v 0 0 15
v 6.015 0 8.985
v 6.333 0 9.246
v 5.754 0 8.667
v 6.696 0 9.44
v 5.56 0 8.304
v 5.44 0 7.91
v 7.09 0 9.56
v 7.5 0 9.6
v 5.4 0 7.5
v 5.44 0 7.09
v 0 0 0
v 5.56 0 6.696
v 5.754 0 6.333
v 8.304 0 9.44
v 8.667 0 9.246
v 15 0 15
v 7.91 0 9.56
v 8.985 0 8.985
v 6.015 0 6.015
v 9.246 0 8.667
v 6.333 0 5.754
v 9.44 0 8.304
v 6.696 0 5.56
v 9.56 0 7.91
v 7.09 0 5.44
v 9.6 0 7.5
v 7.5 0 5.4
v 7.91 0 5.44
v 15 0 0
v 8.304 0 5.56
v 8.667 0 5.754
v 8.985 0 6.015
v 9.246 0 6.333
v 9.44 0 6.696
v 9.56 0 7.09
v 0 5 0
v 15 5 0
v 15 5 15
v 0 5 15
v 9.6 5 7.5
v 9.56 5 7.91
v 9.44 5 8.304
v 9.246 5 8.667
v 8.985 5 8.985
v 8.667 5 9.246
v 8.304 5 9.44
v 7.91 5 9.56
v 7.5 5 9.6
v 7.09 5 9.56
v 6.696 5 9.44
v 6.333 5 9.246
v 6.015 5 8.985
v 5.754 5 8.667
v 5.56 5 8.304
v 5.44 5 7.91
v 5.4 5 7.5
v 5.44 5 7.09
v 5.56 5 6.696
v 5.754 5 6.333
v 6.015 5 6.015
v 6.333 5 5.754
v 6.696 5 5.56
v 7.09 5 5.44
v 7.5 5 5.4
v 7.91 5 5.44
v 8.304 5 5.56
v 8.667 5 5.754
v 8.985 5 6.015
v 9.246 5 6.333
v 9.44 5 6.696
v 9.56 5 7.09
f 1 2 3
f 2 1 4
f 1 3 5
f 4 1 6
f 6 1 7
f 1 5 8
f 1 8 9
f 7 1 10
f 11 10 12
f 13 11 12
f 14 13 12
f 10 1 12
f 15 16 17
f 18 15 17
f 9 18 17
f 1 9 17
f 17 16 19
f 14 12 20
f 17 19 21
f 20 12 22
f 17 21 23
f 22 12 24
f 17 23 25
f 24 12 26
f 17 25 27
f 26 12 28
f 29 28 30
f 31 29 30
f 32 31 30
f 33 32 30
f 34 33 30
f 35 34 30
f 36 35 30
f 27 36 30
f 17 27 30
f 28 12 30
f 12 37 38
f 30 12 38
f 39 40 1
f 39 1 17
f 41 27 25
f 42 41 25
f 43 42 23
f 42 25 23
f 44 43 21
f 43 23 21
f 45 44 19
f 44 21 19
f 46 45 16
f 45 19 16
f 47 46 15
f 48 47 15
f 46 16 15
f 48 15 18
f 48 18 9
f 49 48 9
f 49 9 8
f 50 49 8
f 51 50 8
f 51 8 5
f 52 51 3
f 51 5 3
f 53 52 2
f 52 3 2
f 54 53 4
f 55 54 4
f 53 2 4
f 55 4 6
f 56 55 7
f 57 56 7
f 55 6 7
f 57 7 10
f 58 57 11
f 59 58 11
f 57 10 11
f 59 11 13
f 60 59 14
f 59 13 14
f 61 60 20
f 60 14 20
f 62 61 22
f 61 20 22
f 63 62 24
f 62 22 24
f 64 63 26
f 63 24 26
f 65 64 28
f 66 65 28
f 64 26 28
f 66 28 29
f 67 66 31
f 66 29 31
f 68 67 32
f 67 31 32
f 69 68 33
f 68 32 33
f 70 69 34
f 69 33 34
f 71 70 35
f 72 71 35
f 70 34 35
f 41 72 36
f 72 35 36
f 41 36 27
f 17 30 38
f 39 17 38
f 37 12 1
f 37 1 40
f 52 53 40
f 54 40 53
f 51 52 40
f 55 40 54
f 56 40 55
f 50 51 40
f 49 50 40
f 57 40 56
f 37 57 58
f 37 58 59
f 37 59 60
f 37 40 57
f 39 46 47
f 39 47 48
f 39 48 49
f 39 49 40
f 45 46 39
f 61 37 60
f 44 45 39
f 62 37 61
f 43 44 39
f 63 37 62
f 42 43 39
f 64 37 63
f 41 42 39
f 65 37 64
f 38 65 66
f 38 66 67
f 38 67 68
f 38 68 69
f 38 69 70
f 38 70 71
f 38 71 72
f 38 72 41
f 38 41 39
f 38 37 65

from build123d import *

# Parameters (mm, degrees)
BOX_W        = 15
BOX_H        = 5
BOX_DEPTH    = 15
SKETCH_R     = 2.1
POCKET_DEPTH = 5


with BuildPart() as part:
    # Box → Box (new body)
    with BuildSketch(Plane.XY):
        with Locations((7.5, 2.5)):
            Rectangle(BOX_W, BOX_H)
    extrude(amount=BOX_DEPTH)

    # Sketch → Pocket (cut)
    with BuildSketch(Plane.XZ):
        with Locations((7.5, 7.5)):
            Circle(SKETCH_R)
    extrude(amount=-POCKET_DEPTH, mode=Mode.SUBTRACT)


solid = part.part
